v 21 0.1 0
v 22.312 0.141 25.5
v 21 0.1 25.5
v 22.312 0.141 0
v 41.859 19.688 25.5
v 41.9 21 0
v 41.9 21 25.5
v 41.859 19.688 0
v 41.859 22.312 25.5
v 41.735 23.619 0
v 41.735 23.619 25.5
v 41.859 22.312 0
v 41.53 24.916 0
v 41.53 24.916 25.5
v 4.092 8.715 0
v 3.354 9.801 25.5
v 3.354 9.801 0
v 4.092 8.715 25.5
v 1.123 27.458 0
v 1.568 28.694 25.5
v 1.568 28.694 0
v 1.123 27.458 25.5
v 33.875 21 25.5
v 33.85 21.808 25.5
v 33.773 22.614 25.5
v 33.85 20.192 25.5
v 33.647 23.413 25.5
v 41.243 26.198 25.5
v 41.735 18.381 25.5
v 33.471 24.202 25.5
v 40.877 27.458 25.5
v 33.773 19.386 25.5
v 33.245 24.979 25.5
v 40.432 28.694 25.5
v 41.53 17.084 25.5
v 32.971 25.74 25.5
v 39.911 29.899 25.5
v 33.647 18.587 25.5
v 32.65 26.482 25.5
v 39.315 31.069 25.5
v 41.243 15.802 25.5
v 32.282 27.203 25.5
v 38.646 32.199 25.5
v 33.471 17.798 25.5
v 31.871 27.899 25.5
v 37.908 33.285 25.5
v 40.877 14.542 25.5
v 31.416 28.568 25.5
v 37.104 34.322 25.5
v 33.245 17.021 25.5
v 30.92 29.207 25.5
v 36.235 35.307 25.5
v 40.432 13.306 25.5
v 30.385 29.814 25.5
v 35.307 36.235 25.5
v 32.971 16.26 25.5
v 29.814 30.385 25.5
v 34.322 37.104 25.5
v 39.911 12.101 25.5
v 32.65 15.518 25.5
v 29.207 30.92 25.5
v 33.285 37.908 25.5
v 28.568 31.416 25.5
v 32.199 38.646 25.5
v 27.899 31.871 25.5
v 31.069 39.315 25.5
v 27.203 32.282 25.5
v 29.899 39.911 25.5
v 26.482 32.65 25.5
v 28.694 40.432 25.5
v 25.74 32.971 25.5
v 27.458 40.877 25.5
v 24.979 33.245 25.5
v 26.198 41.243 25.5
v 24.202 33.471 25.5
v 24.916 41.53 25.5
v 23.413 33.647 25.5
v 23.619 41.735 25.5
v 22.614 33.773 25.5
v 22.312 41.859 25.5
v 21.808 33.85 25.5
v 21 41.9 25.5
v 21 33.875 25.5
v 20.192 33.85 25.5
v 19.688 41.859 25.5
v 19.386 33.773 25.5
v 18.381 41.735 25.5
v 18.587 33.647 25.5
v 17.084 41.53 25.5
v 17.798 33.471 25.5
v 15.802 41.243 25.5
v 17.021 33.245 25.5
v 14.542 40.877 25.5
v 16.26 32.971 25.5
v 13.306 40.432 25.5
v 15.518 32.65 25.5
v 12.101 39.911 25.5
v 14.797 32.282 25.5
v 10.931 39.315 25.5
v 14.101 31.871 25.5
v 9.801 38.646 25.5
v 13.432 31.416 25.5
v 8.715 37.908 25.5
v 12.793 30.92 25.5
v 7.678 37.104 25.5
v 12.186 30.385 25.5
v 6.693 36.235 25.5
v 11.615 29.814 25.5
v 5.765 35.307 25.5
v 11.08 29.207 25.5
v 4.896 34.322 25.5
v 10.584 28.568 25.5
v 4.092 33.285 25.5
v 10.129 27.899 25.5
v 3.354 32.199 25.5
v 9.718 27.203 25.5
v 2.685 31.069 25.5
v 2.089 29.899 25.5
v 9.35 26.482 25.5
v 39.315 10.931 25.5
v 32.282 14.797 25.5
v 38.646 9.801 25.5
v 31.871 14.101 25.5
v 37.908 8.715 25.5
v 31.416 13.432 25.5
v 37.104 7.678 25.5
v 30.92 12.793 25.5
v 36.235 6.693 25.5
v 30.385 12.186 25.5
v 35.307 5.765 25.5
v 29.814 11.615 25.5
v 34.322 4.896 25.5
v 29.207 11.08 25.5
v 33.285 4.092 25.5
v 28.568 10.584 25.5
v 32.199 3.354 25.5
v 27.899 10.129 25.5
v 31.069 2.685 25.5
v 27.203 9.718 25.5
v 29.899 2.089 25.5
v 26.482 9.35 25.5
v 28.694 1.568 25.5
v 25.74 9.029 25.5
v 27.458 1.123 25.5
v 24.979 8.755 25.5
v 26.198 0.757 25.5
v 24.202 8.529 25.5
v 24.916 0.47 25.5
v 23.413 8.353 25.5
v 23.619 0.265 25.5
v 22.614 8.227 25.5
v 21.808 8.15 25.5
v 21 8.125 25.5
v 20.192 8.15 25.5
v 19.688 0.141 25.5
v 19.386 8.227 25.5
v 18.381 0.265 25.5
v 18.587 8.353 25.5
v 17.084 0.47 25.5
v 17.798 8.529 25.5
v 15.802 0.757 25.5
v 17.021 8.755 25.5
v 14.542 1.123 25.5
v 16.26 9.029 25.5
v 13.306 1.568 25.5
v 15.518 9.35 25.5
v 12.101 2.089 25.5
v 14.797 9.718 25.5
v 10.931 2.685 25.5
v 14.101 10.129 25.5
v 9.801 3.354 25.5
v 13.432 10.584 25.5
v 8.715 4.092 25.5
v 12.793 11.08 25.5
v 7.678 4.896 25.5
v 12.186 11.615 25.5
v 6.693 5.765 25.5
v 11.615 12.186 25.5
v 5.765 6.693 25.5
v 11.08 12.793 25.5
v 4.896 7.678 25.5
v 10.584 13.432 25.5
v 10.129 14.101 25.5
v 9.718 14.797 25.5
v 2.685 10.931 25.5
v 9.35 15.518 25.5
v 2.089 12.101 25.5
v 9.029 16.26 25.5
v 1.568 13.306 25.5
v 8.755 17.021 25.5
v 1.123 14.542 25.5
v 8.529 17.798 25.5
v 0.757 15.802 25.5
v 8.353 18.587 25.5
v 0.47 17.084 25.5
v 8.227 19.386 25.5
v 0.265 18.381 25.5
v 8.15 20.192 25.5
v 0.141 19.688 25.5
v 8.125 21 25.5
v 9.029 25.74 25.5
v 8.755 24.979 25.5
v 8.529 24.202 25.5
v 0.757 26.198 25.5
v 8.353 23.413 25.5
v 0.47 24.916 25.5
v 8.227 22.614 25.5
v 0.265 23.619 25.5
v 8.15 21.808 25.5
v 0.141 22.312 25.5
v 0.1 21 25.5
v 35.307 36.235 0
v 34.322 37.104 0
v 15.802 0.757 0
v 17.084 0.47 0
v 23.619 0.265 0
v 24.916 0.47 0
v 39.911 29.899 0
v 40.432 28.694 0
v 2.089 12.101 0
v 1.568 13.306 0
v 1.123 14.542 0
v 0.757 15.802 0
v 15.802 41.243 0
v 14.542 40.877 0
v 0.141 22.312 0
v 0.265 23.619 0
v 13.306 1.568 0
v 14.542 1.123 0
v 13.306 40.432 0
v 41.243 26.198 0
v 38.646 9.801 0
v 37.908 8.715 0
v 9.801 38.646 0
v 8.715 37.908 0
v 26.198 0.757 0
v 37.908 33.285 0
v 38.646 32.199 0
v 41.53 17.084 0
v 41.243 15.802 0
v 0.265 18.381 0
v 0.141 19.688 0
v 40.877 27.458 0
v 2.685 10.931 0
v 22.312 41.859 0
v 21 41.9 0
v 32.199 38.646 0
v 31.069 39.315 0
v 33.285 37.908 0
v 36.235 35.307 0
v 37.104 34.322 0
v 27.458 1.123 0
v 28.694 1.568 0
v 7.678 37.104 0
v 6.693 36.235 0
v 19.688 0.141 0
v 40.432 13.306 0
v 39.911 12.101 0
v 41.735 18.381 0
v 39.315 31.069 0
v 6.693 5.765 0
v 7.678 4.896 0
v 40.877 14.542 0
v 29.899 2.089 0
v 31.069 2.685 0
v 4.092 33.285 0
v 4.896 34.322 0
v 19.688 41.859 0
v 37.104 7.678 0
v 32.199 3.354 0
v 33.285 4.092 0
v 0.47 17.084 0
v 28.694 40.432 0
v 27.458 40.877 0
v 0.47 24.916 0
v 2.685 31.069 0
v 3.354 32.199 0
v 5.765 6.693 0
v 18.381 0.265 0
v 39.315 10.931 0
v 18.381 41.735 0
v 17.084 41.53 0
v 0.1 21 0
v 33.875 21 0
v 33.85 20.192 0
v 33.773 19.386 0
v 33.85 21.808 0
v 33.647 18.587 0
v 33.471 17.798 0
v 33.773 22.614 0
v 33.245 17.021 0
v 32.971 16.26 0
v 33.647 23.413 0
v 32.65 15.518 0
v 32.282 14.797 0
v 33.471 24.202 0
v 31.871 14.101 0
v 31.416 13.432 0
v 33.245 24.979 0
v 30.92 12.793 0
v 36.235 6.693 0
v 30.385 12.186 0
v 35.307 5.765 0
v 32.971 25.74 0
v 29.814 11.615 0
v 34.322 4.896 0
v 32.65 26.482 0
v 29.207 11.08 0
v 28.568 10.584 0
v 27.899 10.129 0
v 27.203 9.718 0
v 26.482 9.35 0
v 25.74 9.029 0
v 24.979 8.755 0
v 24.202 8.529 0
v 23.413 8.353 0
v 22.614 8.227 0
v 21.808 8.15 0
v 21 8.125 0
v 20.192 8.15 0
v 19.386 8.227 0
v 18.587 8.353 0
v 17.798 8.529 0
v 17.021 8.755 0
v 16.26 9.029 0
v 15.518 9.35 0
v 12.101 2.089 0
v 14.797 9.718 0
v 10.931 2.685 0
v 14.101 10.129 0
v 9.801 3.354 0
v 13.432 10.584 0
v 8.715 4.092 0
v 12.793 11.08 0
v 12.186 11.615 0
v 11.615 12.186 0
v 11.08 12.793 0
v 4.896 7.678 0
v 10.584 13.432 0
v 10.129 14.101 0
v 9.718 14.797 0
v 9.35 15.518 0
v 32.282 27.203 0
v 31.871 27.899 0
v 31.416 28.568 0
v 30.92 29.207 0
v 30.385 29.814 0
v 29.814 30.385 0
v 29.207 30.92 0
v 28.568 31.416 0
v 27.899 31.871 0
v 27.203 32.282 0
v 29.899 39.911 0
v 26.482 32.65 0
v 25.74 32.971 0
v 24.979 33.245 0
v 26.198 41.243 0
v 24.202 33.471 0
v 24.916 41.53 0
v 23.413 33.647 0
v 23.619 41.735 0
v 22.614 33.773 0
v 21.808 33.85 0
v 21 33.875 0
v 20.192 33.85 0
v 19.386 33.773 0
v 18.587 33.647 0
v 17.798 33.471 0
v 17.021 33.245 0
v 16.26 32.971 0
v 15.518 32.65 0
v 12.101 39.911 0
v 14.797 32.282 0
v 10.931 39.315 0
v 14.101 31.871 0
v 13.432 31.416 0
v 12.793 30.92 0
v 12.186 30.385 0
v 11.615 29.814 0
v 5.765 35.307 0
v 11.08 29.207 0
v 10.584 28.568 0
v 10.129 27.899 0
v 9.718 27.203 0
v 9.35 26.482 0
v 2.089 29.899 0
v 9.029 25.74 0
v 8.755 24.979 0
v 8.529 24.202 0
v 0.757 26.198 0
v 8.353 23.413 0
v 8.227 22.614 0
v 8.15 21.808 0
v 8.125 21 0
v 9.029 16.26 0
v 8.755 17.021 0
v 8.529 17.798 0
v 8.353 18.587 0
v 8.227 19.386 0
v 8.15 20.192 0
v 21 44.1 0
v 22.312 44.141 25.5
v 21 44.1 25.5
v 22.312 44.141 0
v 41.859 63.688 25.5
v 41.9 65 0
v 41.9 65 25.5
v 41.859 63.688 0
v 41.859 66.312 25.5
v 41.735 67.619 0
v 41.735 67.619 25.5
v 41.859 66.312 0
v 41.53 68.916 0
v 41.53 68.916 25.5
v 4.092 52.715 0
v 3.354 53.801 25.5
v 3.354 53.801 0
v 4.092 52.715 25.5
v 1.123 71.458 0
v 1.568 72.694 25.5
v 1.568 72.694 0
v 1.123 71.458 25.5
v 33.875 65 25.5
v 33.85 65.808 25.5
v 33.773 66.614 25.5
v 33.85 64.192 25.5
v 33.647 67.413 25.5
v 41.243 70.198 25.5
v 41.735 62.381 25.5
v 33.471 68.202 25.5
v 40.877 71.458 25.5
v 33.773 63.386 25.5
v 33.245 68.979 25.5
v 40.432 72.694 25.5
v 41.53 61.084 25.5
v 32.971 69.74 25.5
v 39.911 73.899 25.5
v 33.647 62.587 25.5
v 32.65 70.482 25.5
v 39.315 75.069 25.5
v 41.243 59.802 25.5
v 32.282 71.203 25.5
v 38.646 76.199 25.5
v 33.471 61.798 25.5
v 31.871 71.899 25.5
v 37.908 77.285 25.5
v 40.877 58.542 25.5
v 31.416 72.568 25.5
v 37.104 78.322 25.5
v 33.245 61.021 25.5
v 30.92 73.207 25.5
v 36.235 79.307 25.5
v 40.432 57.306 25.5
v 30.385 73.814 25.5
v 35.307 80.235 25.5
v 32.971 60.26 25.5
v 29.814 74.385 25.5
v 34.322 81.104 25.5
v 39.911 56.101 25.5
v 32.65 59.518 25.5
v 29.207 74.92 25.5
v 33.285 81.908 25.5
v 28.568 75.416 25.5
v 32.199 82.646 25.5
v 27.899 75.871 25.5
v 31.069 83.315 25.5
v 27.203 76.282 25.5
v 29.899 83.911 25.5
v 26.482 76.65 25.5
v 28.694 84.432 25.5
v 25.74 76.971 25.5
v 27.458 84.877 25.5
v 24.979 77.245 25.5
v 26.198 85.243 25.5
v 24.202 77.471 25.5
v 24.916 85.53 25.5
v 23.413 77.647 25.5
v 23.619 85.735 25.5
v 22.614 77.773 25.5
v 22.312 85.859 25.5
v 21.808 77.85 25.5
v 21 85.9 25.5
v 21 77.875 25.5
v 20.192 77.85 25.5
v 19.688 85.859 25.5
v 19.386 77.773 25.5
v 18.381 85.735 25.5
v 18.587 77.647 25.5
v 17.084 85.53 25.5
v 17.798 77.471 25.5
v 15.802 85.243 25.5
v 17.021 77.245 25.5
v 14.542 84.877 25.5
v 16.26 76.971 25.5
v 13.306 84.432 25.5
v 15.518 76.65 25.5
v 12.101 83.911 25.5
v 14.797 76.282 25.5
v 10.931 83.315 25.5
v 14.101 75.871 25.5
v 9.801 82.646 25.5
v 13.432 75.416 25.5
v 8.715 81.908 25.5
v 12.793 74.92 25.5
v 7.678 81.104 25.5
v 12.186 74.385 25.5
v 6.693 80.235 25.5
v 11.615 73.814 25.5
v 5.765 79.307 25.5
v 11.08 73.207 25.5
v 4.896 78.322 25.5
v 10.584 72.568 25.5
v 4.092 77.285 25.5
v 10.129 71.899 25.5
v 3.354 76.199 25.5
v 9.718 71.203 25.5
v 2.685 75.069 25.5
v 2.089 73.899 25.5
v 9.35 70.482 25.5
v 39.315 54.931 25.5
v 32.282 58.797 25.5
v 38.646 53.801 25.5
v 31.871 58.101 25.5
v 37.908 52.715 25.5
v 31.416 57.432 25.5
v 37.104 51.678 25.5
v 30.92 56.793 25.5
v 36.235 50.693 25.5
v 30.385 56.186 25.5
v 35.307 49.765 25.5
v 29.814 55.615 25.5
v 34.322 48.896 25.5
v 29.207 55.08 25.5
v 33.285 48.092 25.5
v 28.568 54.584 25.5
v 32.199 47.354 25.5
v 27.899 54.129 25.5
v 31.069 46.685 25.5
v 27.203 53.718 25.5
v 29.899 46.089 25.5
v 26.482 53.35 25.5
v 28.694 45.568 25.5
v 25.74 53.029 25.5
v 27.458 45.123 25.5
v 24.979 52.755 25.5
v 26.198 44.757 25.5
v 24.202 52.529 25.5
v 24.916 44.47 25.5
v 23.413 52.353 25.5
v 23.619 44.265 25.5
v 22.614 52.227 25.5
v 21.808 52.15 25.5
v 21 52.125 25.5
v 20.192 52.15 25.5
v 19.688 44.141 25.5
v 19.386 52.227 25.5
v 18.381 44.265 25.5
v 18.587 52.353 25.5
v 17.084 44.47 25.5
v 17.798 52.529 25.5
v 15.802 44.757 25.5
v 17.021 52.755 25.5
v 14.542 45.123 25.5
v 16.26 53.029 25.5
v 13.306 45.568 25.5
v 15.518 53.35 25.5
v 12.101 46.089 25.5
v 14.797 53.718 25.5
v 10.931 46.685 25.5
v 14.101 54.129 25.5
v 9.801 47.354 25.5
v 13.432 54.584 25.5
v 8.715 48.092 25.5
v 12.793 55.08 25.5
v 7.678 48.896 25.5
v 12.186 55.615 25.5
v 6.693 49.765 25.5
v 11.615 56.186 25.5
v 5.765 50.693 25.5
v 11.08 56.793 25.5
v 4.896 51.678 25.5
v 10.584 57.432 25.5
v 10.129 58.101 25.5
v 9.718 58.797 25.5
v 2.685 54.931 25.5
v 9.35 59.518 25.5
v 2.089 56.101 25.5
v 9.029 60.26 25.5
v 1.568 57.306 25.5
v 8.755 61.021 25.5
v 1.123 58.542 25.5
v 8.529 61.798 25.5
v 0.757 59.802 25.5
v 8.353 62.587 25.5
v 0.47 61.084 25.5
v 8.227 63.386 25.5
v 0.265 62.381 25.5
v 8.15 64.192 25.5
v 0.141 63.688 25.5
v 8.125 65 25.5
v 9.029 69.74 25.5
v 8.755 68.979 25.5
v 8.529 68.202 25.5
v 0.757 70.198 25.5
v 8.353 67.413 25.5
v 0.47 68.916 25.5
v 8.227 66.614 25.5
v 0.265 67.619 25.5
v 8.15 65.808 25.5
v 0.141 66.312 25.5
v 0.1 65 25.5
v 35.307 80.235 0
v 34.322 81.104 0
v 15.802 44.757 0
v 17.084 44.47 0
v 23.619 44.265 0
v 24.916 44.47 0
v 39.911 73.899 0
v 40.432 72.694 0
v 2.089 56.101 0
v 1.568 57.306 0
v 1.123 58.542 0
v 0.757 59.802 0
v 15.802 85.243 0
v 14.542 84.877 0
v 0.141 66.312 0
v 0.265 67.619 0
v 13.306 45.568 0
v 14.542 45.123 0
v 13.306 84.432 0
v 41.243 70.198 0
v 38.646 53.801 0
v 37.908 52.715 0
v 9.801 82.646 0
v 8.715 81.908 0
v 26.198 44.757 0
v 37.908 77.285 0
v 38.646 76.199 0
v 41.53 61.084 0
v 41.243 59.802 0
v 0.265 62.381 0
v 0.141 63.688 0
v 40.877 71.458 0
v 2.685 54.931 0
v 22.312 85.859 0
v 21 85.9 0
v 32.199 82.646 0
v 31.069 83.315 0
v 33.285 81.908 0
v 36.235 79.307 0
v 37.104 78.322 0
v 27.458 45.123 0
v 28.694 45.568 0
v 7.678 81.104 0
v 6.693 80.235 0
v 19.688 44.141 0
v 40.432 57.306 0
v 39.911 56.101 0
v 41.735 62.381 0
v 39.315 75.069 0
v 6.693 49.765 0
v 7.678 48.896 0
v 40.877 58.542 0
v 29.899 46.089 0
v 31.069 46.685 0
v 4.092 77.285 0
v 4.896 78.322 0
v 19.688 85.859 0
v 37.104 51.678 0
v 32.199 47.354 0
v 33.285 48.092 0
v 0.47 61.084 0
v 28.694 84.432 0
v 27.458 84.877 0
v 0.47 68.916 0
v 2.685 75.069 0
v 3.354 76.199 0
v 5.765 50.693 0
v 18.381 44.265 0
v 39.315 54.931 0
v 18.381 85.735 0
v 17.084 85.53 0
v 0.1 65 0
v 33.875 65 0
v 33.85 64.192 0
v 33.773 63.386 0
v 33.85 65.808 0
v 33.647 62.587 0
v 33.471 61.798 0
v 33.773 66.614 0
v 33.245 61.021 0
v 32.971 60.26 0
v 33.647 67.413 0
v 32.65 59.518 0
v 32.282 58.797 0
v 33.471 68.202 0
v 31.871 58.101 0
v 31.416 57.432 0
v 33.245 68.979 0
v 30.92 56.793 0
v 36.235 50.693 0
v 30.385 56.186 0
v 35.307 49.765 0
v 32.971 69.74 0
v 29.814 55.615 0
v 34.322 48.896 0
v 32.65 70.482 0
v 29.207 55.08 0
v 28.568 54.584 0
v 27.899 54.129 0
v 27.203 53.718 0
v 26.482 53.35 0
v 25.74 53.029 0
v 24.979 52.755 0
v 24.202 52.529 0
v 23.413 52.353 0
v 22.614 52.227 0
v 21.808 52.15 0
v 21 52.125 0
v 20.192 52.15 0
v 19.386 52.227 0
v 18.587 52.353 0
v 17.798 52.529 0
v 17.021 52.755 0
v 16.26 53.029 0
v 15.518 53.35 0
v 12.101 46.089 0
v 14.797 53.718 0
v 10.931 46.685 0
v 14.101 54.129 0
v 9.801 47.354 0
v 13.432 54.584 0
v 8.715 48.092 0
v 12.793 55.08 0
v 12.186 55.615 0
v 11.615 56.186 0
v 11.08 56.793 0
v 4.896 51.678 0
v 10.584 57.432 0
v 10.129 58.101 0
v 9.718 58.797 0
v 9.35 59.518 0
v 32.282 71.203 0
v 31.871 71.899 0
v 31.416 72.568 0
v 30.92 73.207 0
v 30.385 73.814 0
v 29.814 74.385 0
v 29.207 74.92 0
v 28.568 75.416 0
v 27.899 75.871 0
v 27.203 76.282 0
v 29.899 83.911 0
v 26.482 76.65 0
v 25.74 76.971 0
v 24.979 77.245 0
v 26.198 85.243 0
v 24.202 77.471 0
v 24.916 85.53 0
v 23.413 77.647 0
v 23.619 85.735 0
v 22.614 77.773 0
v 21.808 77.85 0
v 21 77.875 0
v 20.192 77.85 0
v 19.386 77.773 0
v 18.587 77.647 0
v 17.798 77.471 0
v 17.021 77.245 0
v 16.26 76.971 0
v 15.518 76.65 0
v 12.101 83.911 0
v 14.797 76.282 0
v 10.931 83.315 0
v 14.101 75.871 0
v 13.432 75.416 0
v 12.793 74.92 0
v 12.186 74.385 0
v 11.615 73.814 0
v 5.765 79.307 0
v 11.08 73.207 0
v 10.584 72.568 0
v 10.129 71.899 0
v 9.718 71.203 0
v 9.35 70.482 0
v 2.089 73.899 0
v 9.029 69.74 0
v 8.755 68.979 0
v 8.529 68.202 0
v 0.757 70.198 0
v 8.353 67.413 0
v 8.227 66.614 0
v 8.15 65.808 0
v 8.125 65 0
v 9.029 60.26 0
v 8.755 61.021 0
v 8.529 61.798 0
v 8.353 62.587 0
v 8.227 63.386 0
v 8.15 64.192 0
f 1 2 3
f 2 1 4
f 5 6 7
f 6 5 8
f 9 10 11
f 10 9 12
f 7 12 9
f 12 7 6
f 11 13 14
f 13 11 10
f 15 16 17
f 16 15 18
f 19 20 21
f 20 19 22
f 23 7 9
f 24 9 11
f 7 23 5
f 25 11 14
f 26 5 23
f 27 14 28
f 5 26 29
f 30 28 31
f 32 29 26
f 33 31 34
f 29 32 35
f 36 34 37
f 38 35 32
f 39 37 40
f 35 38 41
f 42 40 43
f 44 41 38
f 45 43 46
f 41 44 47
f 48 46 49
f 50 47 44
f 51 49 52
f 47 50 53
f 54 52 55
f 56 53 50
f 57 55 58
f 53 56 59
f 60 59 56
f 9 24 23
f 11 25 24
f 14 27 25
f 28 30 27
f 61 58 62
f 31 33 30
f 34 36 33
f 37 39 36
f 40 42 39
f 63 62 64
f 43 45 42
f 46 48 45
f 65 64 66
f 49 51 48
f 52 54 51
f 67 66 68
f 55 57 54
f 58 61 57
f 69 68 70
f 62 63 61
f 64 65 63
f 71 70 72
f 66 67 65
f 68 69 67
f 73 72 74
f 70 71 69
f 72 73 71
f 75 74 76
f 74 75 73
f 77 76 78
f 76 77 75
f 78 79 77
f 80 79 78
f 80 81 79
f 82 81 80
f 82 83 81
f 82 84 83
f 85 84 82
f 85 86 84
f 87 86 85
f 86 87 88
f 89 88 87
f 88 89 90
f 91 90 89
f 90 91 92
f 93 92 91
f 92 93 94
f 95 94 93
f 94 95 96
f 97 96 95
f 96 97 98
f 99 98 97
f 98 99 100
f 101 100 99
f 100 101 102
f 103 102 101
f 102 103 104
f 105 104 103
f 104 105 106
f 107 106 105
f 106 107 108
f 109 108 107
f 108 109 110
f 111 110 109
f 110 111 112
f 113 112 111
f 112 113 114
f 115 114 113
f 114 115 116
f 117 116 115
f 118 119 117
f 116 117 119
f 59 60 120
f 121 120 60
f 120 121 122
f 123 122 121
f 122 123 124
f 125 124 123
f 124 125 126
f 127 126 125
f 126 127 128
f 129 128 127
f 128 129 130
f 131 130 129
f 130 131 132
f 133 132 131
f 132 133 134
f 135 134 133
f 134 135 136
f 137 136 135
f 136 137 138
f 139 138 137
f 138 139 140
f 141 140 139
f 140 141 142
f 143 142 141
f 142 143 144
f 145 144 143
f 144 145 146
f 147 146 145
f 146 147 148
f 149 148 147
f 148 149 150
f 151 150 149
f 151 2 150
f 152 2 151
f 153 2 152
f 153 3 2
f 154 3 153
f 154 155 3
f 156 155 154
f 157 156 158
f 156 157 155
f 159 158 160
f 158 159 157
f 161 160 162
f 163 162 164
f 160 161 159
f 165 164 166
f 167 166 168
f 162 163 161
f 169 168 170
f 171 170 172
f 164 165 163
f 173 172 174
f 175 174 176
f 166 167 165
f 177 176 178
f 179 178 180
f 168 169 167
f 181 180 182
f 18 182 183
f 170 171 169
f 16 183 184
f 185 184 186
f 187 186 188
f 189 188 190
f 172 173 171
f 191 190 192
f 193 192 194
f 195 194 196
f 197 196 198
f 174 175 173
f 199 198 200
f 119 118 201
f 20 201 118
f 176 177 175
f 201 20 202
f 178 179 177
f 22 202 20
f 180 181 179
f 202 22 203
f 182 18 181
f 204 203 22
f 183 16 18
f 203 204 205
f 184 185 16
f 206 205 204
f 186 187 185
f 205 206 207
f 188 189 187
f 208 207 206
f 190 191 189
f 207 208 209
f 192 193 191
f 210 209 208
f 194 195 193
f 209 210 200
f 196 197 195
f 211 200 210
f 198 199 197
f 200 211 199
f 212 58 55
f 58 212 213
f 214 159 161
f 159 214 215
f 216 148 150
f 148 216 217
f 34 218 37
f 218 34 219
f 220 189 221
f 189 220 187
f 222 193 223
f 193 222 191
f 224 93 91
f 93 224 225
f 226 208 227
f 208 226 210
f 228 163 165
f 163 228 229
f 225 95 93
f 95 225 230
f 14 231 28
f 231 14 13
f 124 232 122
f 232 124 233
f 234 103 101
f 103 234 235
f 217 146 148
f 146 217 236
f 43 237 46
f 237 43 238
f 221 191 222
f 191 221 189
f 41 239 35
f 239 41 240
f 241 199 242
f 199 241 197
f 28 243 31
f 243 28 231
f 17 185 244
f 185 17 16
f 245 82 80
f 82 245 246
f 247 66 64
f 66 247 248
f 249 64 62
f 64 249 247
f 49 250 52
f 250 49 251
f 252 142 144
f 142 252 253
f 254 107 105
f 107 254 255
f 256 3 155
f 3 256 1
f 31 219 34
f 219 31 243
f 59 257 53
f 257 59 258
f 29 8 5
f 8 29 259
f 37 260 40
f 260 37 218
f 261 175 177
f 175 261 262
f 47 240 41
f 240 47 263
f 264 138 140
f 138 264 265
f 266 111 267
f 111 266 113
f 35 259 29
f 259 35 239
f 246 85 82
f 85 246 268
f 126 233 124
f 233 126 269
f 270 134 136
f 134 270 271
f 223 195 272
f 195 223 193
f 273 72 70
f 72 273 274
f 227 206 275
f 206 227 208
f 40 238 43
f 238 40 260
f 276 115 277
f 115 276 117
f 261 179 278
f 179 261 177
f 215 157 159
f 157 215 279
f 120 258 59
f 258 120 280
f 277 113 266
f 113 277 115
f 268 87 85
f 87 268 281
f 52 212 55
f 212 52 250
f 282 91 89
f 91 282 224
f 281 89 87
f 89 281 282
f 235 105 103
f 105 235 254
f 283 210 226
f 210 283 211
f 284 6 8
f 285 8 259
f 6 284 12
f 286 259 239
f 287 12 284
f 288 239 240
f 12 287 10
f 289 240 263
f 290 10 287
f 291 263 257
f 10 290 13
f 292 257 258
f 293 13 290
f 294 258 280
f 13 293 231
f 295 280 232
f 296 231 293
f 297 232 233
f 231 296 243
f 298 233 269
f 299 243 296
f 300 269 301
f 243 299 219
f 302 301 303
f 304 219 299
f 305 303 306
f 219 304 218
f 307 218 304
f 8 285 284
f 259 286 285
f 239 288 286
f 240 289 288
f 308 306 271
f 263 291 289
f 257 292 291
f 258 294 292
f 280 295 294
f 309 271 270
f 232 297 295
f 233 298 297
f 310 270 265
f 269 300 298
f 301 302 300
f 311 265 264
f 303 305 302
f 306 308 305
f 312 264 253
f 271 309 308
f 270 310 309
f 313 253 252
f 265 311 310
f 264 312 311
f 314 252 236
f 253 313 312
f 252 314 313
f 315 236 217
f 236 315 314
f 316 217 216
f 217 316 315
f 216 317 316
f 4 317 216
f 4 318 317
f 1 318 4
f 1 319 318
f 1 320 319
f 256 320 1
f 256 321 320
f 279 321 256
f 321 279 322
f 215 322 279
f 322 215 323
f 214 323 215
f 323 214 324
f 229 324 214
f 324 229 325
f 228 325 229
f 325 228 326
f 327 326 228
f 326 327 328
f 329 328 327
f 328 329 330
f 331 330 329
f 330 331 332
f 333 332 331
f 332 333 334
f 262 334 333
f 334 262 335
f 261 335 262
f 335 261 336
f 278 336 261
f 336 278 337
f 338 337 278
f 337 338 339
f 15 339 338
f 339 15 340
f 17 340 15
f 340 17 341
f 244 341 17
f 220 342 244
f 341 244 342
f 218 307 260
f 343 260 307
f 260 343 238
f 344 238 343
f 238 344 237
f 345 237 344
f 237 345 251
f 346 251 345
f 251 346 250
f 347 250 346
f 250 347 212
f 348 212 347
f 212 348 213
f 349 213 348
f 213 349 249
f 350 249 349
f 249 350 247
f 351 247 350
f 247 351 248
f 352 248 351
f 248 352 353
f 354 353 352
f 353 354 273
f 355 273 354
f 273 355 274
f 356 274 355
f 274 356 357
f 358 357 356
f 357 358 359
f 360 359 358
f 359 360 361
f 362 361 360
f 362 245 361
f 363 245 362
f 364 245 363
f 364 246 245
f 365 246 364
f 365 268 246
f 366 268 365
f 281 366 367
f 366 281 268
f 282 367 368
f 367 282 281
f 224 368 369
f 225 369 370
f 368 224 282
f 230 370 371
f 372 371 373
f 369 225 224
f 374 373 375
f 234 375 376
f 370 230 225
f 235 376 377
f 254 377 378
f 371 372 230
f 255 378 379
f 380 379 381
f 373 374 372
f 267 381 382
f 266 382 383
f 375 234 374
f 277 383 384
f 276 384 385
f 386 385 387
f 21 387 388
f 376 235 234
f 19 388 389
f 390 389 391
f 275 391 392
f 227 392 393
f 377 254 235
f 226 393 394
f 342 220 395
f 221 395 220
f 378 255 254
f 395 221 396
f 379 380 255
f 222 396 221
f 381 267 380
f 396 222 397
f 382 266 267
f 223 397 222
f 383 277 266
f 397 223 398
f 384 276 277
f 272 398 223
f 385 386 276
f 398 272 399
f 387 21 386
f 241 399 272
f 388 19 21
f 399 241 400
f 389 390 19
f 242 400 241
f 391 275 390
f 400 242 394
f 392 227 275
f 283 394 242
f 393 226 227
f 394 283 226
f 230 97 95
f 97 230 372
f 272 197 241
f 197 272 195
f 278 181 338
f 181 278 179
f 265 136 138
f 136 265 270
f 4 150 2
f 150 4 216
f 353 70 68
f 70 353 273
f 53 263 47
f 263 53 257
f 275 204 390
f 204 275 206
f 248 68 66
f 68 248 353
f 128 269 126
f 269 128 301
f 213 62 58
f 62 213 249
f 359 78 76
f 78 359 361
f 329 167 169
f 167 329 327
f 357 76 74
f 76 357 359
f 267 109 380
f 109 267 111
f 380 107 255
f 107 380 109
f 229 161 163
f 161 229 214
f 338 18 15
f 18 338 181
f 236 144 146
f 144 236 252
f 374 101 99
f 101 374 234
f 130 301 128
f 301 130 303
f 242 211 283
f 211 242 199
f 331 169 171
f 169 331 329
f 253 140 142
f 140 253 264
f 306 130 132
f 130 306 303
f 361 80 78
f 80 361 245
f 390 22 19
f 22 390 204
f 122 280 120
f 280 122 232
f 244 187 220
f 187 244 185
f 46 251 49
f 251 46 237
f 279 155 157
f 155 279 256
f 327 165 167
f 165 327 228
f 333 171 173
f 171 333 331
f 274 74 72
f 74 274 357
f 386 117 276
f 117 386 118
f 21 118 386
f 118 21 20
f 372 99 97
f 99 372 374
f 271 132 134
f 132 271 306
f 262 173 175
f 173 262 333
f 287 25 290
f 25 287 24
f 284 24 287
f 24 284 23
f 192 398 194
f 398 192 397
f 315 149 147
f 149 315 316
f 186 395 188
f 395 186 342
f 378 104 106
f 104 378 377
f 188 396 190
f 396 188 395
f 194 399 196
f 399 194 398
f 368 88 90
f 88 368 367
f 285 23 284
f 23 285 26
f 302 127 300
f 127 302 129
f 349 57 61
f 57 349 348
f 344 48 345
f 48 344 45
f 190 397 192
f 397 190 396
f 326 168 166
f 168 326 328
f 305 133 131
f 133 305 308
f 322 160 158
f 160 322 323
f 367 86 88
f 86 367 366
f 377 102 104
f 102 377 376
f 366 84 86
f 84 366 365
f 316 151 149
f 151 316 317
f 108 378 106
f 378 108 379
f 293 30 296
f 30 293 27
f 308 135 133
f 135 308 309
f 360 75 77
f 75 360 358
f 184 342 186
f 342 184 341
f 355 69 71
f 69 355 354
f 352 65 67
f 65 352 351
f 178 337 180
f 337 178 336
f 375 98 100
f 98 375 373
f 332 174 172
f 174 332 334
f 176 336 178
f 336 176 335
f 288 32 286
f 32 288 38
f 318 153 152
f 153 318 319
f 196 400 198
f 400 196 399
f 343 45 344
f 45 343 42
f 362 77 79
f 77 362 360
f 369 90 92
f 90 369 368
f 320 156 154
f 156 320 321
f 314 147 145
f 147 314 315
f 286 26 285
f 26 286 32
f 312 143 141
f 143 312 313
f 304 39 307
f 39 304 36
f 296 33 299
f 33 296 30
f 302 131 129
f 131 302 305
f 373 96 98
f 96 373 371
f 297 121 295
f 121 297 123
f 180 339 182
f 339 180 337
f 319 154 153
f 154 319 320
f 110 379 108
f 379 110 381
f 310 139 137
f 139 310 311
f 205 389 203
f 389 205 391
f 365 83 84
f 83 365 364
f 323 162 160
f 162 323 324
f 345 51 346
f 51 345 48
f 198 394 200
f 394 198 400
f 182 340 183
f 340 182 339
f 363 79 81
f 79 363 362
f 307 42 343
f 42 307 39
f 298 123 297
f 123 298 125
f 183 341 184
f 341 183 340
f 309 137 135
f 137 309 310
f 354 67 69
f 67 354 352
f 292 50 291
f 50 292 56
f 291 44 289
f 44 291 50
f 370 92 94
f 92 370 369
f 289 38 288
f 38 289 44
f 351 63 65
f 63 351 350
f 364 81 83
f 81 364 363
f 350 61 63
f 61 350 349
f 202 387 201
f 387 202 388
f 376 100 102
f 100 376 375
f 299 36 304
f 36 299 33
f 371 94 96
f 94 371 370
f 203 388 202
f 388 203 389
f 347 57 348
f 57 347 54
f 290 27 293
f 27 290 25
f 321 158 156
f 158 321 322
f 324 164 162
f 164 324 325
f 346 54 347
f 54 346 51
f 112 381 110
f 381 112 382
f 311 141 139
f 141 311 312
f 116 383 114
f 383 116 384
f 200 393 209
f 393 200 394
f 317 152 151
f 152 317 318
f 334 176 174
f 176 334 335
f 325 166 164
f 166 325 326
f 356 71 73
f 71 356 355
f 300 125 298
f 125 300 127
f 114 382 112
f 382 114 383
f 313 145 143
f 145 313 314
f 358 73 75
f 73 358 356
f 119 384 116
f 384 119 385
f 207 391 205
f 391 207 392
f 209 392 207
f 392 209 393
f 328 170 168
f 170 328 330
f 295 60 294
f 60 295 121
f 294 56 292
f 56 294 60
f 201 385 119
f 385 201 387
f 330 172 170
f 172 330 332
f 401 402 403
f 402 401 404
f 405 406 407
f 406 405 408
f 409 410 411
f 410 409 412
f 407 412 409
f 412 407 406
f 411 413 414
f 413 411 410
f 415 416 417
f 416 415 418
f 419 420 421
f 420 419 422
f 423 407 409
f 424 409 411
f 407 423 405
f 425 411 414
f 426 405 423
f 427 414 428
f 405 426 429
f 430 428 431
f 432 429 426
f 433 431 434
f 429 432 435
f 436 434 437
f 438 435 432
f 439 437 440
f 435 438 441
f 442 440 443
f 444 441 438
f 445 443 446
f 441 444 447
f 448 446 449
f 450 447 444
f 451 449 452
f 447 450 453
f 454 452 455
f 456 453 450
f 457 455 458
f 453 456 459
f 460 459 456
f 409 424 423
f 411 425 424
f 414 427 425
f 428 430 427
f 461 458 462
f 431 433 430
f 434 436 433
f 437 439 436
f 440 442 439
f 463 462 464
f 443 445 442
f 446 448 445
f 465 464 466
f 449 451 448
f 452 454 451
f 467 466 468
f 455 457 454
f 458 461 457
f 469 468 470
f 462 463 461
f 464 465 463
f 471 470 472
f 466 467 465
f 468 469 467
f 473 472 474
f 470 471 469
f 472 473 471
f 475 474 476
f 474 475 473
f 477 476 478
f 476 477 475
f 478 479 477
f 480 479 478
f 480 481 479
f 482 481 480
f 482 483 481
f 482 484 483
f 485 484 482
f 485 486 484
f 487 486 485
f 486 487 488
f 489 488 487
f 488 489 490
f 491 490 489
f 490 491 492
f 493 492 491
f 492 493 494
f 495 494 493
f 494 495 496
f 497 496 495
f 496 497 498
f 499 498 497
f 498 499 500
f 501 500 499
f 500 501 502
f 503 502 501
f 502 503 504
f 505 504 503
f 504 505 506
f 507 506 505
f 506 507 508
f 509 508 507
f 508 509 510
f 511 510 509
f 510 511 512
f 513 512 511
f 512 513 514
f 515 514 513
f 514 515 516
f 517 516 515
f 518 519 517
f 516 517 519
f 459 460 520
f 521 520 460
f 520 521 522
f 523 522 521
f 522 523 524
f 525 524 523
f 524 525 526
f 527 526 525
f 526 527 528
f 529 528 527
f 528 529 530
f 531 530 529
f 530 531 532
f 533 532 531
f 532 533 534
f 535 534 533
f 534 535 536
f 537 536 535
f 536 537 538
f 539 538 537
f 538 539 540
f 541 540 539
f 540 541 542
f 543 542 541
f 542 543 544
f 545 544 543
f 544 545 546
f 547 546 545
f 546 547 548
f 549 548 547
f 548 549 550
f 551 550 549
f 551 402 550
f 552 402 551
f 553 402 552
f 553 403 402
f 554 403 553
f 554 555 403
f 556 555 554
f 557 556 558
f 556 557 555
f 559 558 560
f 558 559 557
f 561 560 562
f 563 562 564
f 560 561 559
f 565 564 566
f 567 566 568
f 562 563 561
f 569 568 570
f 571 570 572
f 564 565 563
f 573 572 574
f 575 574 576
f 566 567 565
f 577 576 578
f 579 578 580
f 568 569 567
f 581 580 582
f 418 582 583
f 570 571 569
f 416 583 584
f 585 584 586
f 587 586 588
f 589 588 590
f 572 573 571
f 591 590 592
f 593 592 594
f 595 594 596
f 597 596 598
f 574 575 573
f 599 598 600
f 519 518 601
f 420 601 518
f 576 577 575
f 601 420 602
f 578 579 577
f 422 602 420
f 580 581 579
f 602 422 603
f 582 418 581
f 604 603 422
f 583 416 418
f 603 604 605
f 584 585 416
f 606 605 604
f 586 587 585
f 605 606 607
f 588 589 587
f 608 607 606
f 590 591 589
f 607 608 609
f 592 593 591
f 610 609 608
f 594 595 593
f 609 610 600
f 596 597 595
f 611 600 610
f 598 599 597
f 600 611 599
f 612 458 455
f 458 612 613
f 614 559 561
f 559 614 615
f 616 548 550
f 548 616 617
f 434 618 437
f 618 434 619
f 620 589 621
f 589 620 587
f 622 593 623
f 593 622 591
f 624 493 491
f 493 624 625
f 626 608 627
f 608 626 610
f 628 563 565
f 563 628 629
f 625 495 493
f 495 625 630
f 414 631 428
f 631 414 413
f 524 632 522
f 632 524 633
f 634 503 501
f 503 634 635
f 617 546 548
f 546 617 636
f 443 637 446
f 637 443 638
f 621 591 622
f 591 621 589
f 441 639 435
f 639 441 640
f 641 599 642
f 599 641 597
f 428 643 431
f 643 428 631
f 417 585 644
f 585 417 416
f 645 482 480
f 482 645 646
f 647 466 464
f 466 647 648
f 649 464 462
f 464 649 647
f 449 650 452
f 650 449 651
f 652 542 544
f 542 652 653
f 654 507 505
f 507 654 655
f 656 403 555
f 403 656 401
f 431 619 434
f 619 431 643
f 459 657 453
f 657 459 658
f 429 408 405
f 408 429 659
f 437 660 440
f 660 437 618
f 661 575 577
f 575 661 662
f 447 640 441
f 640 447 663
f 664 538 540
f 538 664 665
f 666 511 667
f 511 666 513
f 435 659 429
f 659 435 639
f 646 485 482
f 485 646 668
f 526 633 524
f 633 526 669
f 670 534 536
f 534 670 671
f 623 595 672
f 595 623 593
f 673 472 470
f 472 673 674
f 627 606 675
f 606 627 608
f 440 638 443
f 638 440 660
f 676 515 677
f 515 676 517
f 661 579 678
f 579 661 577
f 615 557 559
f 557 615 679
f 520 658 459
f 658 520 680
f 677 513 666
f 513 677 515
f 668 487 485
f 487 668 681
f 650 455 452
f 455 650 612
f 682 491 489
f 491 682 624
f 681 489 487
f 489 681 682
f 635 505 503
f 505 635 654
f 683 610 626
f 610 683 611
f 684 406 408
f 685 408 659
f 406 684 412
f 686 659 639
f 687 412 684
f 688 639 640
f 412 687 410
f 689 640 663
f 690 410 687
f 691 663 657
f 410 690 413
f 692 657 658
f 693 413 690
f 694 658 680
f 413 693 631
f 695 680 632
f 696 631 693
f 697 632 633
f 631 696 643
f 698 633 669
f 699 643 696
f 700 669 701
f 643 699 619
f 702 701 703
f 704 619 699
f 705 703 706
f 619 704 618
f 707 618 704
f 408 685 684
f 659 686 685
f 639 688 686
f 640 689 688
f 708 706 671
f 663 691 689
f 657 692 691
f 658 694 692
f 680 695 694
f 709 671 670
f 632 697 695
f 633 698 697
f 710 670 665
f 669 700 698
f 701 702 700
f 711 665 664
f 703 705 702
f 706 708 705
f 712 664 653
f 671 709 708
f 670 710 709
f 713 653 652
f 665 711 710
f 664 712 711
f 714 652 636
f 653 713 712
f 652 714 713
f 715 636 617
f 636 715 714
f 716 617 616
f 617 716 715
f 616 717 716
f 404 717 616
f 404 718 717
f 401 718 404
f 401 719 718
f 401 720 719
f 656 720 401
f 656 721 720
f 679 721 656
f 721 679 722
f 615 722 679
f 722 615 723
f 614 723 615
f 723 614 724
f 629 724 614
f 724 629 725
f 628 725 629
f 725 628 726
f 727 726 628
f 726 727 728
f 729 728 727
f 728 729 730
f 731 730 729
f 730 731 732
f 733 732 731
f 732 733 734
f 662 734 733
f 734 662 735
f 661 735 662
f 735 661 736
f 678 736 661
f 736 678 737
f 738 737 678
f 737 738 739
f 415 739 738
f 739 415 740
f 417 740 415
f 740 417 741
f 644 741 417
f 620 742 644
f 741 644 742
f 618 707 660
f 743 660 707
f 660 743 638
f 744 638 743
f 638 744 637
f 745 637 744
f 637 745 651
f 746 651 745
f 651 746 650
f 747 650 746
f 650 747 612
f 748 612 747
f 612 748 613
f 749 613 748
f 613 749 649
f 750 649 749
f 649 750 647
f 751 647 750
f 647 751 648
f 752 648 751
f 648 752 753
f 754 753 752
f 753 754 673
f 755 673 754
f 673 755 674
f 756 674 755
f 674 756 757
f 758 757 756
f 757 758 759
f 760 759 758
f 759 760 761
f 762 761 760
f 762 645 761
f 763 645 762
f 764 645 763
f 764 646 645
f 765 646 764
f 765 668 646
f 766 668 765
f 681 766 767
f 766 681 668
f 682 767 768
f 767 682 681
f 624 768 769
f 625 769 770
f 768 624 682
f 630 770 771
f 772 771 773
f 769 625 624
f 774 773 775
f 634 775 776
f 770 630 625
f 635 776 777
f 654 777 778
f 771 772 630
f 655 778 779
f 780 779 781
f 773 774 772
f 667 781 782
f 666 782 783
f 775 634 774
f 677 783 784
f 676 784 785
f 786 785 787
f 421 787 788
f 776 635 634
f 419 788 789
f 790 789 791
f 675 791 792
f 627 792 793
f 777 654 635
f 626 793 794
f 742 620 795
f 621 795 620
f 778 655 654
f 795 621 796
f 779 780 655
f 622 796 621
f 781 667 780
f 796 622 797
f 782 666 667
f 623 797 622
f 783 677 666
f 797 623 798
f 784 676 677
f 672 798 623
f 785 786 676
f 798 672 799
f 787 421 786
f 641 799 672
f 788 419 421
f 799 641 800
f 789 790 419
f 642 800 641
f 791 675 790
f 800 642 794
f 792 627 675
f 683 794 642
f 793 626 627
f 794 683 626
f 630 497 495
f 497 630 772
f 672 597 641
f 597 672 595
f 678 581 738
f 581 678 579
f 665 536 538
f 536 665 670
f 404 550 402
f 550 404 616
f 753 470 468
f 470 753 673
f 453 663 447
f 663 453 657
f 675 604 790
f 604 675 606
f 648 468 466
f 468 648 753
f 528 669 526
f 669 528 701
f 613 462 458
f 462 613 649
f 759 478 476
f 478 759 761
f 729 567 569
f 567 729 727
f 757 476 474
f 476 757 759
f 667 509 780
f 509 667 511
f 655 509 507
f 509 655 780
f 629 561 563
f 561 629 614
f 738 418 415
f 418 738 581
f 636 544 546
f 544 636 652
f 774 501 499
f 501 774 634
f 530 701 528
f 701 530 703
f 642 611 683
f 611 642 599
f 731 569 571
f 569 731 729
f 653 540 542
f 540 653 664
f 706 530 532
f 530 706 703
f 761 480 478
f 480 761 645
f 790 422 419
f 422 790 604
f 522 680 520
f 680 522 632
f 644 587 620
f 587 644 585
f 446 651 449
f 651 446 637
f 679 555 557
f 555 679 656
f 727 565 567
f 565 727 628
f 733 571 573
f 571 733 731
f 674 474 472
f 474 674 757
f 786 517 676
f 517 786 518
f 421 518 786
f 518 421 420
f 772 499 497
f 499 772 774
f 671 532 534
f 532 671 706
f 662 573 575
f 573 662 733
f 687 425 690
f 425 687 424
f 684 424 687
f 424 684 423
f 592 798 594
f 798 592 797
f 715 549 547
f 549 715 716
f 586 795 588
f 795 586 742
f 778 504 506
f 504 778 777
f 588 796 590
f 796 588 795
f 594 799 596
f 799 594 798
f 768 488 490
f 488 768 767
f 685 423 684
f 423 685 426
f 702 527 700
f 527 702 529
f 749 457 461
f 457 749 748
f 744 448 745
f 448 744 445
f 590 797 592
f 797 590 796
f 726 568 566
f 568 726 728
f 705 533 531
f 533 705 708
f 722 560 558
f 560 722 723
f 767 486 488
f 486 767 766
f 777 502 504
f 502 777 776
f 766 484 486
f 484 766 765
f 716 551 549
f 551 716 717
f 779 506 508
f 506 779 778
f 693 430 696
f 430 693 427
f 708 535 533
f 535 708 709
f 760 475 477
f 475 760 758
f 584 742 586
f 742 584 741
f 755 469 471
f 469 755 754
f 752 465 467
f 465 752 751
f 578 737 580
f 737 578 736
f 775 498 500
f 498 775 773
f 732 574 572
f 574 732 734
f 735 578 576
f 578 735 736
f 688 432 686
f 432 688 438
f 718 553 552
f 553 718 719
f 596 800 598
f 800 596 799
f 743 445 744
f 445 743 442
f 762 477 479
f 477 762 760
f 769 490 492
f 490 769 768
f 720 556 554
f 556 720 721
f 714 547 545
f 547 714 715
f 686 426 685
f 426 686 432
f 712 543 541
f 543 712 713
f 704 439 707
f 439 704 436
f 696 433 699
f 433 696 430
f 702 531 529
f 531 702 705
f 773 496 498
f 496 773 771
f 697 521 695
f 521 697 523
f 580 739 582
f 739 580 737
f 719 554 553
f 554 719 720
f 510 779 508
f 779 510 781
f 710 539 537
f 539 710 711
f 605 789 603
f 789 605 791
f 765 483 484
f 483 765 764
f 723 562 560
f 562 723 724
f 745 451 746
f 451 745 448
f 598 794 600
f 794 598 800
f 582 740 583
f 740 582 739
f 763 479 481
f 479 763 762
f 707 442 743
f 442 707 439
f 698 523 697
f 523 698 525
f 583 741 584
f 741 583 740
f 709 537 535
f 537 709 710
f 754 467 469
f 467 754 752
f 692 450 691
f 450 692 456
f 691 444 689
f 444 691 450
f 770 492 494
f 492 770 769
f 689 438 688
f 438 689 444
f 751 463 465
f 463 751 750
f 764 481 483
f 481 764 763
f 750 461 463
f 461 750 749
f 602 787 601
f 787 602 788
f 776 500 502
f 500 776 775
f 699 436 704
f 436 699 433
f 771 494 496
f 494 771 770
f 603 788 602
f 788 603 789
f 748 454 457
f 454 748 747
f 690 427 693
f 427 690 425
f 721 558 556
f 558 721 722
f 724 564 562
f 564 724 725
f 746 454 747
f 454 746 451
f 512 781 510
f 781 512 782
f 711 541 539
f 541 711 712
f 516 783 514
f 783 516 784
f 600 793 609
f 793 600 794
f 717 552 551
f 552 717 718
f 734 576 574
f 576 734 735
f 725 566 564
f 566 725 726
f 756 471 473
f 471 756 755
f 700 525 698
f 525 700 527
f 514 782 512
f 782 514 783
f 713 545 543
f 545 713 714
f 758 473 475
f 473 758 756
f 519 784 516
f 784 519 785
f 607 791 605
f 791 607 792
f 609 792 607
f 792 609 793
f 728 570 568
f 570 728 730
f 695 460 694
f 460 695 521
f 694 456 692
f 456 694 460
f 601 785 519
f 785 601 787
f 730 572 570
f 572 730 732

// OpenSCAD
module ring1() {
		// Part 3, ring 1

		translate([21, 21, 0])
		difference() {
			cylinder(h = 25.5, r = 20.9, $fn = 100);
			cylinder(h = 25.5, r = 12.875, $fn = 100);
		}
}

module funnel_tip() {
	union() {

		// Part 1, funnel

		// diameter 32.8 (radius , place (x.y) such that there is 1mm margin
		translate([17.4, 17.4, 0])
		union() {
			difference() { 	
				cylinder(h = 12.8, r1 = 16.4, r2 = 8.95, $fn = 100);		
				cylinder(h = 8.7, r1 = 15.4, r2 = 6.75, $fn = 100);
				translate([0, 0, 8.7])
				cylinder(h = 7.5, r = 6.75, $fn = 100);
			}
			translate([0, 0, 12.8])
			difference() { 
				cylinder(h = 50.7, r = 8.95, $fn = 100);		
				cylinder(h = 50.7, r = 6.75, $fn = 100);
			}
		}


		// Part 2, funnel tip


		/* Notes on placing grooves 
		Base shape (cube + cylinder) is dislocated based on largest radius minus width of cube.
		*/

		// max radius 41.8, place (x.y) such that there is 1mm margin
		// between all elements

		difference() {
			translate([55.7, 21.9, 0])
			union() {
			//base
				difference() {
					cylinder(h = 11.6, r1 = 16.3, r2 = 20.9, $fn = 100); // r1 = 32.6, r2 = 41.8
					cylinder(h = 11.6, r1 = 15.3, r2 = 9, $fn = 100); // r1 = 30.6, r2 = 18
				}
				translate([0, 0, 11.6])
				difference() {
					cylinder(h = 15, r = 20.9, $fn = 100);
					cylinder(h = 15, r = 9, $fn = 100);
				}
				translate([0, 0, 26.6])
				difference() {
					cylinder(h = 10, r = 12.875, $fn = 100);
					cylinder(h = 10, r = 9, $fn = 100);
				}
			}

			translate([55.7, 21.9, 19.6])
			difference() {
				cylinder(h=3.5, r = 20.9, $fn = 100);
				cylinder(h=3.5, r1 = 18.5, r2 = 20.9, $fn = 100);
			}

			// 1st groove, S
			translate([55.7, 2.15,0])
			union() {
				translate([0, 0, 20.8])	  
				rotate ([90,0,0]) cylinder 
				(h = 2.3, r=2.25, center = true, $fn = 100);
				translate([0, 0, 10.4])	  
				cube([4.5, 2.3, 20.8], center = true, $fn = 100);
			}

			// 2nd groove, N
			// translate([55.7, 2.15,0]) // 2.15 + 39.5 = 41.65
			translate([55.7, 41.65,0]) 
			union() {
				translate([0, 0, 20.8])	  
				rotate ([90,0,0]) cylinder 
				(h = 2.3, r=2.25, center = true, $fn = 100);
				translate([0, 0, 10.4])	  
				cube([4.5, 2.3, 20.8], center = true, $fn = 100);
			}

			// 3rd groove, SW
			translate([38.596, 12.025,0]) 
			union() {
				translate([0, 0, 20.8])	  
				rotate ([90,0,120]) cylinder (h = 2.3, r=2.25, center = true, $fn = 100);

				translate([0, 0, 10.4])	
				rotate ([0,0,120])   
				cube([4.5, 2.3, 20.8], center = true, $fn = 100);
			}

			// wire groove, between S and SW groove
			translate([45.825, 4.796,0]) 
			union() {
				translate([0, 0, 20.8])	  
				rotate ([90,0,150]) cylinder (h = 2.3, r=2.25, center = true, $fn = 100);

				translate([0, 0, 10.4])	
				rotate ([0,0,150])   
				cube([4.5, 2.3, 20.8], center = true, $fn = 100);
			}

			// 4th groove, NE
			translate([72.804, 31.775,0]) 
			union() {
				translate([0, 0, 20.8])	  
				rotate ([90,0,120]) cylinder (h = 2.3, r=2.25, center = true, $fn = 100);

				translate([0, 0, 10.4])	
				rotate ([0,0,120])   
				cube([4.5, 2.3, 20.8], center = true, $fn = 100);
			}

			// 5th groove, SE
			translate([72.804, 12.025,0]) 
			union() {
				translate([0, 0, 20.8])	  
				rotate ([90,0,60]) cylinder (h = 2.3, r=2.25, center = true, $fn = 100);

				translate([0, 0, 10.4])	
				rotate ([0,0,60])   
				cube([4.5, 2.3, 20.8], center = true, $fn = 100);
			}

			// 6th groove, SE
			translate([38.596, 31.775,0]) 
			union() {
				translate([0, 0, 20.8])	  
				rotate ([90,0,60]) cylinder (h = 2.3, r=2.25, center = true, $fn = 100);

				translate([0, 0, 10.4])	
				rotate ([0,0,60])   
				cube([4.5, 2.3, 20.8], center = true, $fn = 100);
			}
		}


		// Part 3, ring 1

		translate([21.9, 55.7, 0])
		difference() {
			cylinder(h = 25.5, r = 20.9, $fn = 100);
			cylinder(h = 25.5, r = 12.875, $fn = 100);
		}

		// Part 4, ring 2

		translate([55.95, 55.95, 0])
		difference() {
			cylinder(h = 5, r = 12.15, $fn = 100);
			cylinder(h = 5, r = 8.3, $fn = 100);
		}
	}
}

// funnel_tip();

ring1();
translate([0, 44, 0])
ring1();
